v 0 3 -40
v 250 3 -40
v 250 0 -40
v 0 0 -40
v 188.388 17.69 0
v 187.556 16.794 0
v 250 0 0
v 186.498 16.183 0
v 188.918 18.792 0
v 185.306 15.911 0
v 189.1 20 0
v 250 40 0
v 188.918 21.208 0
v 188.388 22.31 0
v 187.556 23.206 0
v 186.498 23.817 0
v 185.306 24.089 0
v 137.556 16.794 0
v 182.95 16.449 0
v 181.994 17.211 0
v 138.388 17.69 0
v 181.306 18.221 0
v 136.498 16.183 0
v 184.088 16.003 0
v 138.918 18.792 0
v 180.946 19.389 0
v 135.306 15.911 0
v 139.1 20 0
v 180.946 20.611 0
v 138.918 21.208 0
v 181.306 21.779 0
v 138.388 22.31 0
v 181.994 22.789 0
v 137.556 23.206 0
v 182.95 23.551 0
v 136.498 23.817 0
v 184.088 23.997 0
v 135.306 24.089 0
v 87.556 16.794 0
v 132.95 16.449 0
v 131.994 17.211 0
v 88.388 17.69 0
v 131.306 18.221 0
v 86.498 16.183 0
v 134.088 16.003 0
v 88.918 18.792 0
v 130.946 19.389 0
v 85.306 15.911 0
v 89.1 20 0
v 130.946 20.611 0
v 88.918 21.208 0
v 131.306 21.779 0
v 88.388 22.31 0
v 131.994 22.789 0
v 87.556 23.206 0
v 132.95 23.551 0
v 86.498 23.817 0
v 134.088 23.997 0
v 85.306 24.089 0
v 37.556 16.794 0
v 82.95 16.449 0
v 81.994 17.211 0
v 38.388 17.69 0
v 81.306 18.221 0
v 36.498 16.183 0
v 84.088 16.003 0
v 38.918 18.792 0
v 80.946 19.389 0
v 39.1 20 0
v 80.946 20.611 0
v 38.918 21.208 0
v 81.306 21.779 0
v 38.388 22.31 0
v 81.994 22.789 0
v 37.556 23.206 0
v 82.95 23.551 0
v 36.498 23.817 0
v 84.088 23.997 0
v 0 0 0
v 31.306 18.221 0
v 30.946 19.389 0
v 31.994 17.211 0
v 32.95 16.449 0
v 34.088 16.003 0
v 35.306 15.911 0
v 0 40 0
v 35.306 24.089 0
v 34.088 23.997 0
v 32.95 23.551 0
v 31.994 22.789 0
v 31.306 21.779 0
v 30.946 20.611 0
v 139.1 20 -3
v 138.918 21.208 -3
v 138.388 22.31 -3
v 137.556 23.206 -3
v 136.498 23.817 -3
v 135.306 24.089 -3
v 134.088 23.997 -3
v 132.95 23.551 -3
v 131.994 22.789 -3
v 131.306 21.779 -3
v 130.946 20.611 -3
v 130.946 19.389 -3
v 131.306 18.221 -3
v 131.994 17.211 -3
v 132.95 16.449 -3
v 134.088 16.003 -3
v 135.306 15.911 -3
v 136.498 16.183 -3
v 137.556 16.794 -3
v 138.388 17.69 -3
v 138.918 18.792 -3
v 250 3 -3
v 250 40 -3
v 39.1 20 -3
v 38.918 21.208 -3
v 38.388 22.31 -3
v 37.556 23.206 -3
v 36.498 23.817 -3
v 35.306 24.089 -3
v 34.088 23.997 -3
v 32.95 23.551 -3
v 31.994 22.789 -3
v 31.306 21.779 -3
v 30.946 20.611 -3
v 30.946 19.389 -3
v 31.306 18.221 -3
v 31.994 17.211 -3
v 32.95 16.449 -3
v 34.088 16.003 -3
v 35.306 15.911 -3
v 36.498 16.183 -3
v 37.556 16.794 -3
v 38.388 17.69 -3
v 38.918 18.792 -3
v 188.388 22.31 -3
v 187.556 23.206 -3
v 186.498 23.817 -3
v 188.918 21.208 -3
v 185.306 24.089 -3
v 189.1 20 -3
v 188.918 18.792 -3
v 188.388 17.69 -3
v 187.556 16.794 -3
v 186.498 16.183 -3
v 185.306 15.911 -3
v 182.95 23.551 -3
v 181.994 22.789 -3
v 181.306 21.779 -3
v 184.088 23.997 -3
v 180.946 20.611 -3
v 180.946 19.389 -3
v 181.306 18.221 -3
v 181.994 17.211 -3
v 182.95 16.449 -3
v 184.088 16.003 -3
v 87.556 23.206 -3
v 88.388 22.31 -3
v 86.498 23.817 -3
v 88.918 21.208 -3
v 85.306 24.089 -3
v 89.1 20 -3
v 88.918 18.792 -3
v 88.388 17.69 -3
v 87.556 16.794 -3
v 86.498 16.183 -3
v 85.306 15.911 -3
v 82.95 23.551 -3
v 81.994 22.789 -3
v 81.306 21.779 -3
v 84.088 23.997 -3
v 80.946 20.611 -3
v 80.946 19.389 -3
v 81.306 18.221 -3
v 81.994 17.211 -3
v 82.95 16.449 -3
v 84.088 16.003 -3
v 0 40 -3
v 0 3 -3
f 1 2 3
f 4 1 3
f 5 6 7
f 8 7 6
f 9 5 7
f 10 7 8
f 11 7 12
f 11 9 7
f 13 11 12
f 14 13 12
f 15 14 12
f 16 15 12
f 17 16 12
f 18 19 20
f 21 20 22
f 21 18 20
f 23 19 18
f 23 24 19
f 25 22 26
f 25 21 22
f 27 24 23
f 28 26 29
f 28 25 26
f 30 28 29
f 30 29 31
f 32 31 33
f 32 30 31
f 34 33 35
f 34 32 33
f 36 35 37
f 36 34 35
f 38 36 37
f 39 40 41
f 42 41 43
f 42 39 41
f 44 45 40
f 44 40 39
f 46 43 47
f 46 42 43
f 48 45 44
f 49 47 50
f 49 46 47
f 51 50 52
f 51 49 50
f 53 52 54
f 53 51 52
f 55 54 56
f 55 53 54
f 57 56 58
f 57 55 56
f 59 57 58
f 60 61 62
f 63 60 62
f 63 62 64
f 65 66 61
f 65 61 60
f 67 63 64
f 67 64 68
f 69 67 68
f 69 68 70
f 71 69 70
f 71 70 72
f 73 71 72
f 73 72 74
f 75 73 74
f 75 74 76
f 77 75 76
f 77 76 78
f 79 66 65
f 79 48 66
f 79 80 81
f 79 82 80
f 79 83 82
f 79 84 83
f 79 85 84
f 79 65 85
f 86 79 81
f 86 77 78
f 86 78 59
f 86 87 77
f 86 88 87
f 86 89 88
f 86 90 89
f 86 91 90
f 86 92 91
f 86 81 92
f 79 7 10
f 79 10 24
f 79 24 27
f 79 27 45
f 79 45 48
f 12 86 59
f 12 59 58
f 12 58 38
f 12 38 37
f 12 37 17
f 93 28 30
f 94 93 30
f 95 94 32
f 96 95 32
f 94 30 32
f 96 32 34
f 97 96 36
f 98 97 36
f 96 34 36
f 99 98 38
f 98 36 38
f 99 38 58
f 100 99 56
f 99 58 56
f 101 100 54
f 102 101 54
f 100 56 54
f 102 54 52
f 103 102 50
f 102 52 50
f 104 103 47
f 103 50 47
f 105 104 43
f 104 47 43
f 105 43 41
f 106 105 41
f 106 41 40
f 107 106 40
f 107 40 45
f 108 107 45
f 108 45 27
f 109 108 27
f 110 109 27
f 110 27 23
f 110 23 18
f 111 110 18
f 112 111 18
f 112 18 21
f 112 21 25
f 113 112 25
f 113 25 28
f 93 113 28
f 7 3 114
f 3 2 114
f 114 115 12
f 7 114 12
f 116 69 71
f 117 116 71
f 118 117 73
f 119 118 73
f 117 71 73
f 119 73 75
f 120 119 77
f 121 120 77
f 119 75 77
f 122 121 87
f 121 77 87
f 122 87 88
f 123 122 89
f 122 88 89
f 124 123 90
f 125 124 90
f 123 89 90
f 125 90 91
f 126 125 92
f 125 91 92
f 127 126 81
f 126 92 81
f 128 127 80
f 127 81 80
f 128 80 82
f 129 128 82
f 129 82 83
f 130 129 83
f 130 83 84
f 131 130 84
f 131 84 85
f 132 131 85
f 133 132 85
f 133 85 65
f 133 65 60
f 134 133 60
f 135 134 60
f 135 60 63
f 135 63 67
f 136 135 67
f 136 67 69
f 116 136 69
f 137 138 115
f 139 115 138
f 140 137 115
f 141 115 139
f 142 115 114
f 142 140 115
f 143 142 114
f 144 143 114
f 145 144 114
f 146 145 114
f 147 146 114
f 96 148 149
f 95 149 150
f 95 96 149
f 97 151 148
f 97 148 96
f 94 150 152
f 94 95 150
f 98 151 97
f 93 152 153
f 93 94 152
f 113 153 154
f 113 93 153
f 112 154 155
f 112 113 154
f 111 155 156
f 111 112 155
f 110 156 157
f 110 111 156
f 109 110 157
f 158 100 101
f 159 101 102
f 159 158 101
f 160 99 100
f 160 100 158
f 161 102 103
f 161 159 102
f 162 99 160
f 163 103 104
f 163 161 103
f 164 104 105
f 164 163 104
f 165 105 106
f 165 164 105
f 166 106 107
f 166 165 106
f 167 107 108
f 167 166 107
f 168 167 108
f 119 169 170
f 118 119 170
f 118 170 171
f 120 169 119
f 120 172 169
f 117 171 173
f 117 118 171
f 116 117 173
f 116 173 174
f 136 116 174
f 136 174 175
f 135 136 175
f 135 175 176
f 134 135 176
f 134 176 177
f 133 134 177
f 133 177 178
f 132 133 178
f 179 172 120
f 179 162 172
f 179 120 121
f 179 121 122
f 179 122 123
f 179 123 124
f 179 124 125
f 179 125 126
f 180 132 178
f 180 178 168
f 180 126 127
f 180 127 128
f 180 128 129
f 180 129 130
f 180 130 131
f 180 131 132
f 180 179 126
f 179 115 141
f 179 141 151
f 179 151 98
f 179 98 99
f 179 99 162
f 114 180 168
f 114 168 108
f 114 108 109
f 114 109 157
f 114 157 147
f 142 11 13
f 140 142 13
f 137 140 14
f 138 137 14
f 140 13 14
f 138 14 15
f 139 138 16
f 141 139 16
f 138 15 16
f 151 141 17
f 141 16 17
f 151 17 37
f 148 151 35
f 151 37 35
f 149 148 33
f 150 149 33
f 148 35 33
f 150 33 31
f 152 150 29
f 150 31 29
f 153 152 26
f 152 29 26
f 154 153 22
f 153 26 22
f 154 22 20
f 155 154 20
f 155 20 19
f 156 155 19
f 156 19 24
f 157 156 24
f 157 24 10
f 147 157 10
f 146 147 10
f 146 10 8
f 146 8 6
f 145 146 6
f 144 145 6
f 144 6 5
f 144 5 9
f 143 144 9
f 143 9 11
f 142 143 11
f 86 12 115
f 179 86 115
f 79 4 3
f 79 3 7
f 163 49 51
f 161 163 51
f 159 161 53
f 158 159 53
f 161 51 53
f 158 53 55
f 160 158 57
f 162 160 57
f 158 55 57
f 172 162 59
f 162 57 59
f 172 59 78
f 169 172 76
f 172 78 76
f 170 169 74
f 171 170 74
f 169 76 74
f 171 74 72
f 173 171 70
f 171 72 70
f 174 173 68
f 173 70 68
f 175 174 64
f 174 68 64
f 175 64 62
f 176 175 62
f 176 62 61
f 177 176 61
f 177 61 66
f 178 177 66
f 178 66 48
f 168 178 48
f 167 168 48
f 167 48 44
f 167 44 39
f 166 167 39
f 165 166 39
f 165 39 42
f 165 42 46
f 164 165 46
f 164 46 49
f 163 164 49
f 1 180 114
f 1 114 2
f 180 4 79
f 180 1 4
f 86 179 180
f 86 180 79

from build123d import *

# Parameters (mm, degrees)
EXTRUDE_1_DEPTH     = 250
SKETCH_2_R          = 4.1
CUT_EXTRUDE_1_DEPTH = 10


with BuildPart() as part:
    # Эскиз1 → Вытянуть-Тонкостенный1 (new body)
    with BuildSketch(Plane(origin=(0, 0, 0), x_dir=(0, 0, -1), z_dir=(1, 0, 0))):
        Polygon((40, 0), (0, 0), (0, 40), (3, 40), (3, 3), (40, 3), align=None)
    extrude(amount=EXTRUDE_1_DEPTH)

    # Эскиз2 → Вырез-Вытянуть1 (cut)
    with BuildSketch(Plane.XY):
        with Locations((35, 20)):
            Circle(SKETCH_2_R)
        with Locations((85, 20)):
            Circle(SKETCH_2_R)
        with Locations((135, 20)):
            Circle(SKETCH_2_R)
        with Locations((185, 20)):
            Circle(SKETCH_2_R)
    extrude(amount=-CUT_EXTRUDE_1_DEPTH, mode=Mode.SUBTRACT)


solid = part.part
